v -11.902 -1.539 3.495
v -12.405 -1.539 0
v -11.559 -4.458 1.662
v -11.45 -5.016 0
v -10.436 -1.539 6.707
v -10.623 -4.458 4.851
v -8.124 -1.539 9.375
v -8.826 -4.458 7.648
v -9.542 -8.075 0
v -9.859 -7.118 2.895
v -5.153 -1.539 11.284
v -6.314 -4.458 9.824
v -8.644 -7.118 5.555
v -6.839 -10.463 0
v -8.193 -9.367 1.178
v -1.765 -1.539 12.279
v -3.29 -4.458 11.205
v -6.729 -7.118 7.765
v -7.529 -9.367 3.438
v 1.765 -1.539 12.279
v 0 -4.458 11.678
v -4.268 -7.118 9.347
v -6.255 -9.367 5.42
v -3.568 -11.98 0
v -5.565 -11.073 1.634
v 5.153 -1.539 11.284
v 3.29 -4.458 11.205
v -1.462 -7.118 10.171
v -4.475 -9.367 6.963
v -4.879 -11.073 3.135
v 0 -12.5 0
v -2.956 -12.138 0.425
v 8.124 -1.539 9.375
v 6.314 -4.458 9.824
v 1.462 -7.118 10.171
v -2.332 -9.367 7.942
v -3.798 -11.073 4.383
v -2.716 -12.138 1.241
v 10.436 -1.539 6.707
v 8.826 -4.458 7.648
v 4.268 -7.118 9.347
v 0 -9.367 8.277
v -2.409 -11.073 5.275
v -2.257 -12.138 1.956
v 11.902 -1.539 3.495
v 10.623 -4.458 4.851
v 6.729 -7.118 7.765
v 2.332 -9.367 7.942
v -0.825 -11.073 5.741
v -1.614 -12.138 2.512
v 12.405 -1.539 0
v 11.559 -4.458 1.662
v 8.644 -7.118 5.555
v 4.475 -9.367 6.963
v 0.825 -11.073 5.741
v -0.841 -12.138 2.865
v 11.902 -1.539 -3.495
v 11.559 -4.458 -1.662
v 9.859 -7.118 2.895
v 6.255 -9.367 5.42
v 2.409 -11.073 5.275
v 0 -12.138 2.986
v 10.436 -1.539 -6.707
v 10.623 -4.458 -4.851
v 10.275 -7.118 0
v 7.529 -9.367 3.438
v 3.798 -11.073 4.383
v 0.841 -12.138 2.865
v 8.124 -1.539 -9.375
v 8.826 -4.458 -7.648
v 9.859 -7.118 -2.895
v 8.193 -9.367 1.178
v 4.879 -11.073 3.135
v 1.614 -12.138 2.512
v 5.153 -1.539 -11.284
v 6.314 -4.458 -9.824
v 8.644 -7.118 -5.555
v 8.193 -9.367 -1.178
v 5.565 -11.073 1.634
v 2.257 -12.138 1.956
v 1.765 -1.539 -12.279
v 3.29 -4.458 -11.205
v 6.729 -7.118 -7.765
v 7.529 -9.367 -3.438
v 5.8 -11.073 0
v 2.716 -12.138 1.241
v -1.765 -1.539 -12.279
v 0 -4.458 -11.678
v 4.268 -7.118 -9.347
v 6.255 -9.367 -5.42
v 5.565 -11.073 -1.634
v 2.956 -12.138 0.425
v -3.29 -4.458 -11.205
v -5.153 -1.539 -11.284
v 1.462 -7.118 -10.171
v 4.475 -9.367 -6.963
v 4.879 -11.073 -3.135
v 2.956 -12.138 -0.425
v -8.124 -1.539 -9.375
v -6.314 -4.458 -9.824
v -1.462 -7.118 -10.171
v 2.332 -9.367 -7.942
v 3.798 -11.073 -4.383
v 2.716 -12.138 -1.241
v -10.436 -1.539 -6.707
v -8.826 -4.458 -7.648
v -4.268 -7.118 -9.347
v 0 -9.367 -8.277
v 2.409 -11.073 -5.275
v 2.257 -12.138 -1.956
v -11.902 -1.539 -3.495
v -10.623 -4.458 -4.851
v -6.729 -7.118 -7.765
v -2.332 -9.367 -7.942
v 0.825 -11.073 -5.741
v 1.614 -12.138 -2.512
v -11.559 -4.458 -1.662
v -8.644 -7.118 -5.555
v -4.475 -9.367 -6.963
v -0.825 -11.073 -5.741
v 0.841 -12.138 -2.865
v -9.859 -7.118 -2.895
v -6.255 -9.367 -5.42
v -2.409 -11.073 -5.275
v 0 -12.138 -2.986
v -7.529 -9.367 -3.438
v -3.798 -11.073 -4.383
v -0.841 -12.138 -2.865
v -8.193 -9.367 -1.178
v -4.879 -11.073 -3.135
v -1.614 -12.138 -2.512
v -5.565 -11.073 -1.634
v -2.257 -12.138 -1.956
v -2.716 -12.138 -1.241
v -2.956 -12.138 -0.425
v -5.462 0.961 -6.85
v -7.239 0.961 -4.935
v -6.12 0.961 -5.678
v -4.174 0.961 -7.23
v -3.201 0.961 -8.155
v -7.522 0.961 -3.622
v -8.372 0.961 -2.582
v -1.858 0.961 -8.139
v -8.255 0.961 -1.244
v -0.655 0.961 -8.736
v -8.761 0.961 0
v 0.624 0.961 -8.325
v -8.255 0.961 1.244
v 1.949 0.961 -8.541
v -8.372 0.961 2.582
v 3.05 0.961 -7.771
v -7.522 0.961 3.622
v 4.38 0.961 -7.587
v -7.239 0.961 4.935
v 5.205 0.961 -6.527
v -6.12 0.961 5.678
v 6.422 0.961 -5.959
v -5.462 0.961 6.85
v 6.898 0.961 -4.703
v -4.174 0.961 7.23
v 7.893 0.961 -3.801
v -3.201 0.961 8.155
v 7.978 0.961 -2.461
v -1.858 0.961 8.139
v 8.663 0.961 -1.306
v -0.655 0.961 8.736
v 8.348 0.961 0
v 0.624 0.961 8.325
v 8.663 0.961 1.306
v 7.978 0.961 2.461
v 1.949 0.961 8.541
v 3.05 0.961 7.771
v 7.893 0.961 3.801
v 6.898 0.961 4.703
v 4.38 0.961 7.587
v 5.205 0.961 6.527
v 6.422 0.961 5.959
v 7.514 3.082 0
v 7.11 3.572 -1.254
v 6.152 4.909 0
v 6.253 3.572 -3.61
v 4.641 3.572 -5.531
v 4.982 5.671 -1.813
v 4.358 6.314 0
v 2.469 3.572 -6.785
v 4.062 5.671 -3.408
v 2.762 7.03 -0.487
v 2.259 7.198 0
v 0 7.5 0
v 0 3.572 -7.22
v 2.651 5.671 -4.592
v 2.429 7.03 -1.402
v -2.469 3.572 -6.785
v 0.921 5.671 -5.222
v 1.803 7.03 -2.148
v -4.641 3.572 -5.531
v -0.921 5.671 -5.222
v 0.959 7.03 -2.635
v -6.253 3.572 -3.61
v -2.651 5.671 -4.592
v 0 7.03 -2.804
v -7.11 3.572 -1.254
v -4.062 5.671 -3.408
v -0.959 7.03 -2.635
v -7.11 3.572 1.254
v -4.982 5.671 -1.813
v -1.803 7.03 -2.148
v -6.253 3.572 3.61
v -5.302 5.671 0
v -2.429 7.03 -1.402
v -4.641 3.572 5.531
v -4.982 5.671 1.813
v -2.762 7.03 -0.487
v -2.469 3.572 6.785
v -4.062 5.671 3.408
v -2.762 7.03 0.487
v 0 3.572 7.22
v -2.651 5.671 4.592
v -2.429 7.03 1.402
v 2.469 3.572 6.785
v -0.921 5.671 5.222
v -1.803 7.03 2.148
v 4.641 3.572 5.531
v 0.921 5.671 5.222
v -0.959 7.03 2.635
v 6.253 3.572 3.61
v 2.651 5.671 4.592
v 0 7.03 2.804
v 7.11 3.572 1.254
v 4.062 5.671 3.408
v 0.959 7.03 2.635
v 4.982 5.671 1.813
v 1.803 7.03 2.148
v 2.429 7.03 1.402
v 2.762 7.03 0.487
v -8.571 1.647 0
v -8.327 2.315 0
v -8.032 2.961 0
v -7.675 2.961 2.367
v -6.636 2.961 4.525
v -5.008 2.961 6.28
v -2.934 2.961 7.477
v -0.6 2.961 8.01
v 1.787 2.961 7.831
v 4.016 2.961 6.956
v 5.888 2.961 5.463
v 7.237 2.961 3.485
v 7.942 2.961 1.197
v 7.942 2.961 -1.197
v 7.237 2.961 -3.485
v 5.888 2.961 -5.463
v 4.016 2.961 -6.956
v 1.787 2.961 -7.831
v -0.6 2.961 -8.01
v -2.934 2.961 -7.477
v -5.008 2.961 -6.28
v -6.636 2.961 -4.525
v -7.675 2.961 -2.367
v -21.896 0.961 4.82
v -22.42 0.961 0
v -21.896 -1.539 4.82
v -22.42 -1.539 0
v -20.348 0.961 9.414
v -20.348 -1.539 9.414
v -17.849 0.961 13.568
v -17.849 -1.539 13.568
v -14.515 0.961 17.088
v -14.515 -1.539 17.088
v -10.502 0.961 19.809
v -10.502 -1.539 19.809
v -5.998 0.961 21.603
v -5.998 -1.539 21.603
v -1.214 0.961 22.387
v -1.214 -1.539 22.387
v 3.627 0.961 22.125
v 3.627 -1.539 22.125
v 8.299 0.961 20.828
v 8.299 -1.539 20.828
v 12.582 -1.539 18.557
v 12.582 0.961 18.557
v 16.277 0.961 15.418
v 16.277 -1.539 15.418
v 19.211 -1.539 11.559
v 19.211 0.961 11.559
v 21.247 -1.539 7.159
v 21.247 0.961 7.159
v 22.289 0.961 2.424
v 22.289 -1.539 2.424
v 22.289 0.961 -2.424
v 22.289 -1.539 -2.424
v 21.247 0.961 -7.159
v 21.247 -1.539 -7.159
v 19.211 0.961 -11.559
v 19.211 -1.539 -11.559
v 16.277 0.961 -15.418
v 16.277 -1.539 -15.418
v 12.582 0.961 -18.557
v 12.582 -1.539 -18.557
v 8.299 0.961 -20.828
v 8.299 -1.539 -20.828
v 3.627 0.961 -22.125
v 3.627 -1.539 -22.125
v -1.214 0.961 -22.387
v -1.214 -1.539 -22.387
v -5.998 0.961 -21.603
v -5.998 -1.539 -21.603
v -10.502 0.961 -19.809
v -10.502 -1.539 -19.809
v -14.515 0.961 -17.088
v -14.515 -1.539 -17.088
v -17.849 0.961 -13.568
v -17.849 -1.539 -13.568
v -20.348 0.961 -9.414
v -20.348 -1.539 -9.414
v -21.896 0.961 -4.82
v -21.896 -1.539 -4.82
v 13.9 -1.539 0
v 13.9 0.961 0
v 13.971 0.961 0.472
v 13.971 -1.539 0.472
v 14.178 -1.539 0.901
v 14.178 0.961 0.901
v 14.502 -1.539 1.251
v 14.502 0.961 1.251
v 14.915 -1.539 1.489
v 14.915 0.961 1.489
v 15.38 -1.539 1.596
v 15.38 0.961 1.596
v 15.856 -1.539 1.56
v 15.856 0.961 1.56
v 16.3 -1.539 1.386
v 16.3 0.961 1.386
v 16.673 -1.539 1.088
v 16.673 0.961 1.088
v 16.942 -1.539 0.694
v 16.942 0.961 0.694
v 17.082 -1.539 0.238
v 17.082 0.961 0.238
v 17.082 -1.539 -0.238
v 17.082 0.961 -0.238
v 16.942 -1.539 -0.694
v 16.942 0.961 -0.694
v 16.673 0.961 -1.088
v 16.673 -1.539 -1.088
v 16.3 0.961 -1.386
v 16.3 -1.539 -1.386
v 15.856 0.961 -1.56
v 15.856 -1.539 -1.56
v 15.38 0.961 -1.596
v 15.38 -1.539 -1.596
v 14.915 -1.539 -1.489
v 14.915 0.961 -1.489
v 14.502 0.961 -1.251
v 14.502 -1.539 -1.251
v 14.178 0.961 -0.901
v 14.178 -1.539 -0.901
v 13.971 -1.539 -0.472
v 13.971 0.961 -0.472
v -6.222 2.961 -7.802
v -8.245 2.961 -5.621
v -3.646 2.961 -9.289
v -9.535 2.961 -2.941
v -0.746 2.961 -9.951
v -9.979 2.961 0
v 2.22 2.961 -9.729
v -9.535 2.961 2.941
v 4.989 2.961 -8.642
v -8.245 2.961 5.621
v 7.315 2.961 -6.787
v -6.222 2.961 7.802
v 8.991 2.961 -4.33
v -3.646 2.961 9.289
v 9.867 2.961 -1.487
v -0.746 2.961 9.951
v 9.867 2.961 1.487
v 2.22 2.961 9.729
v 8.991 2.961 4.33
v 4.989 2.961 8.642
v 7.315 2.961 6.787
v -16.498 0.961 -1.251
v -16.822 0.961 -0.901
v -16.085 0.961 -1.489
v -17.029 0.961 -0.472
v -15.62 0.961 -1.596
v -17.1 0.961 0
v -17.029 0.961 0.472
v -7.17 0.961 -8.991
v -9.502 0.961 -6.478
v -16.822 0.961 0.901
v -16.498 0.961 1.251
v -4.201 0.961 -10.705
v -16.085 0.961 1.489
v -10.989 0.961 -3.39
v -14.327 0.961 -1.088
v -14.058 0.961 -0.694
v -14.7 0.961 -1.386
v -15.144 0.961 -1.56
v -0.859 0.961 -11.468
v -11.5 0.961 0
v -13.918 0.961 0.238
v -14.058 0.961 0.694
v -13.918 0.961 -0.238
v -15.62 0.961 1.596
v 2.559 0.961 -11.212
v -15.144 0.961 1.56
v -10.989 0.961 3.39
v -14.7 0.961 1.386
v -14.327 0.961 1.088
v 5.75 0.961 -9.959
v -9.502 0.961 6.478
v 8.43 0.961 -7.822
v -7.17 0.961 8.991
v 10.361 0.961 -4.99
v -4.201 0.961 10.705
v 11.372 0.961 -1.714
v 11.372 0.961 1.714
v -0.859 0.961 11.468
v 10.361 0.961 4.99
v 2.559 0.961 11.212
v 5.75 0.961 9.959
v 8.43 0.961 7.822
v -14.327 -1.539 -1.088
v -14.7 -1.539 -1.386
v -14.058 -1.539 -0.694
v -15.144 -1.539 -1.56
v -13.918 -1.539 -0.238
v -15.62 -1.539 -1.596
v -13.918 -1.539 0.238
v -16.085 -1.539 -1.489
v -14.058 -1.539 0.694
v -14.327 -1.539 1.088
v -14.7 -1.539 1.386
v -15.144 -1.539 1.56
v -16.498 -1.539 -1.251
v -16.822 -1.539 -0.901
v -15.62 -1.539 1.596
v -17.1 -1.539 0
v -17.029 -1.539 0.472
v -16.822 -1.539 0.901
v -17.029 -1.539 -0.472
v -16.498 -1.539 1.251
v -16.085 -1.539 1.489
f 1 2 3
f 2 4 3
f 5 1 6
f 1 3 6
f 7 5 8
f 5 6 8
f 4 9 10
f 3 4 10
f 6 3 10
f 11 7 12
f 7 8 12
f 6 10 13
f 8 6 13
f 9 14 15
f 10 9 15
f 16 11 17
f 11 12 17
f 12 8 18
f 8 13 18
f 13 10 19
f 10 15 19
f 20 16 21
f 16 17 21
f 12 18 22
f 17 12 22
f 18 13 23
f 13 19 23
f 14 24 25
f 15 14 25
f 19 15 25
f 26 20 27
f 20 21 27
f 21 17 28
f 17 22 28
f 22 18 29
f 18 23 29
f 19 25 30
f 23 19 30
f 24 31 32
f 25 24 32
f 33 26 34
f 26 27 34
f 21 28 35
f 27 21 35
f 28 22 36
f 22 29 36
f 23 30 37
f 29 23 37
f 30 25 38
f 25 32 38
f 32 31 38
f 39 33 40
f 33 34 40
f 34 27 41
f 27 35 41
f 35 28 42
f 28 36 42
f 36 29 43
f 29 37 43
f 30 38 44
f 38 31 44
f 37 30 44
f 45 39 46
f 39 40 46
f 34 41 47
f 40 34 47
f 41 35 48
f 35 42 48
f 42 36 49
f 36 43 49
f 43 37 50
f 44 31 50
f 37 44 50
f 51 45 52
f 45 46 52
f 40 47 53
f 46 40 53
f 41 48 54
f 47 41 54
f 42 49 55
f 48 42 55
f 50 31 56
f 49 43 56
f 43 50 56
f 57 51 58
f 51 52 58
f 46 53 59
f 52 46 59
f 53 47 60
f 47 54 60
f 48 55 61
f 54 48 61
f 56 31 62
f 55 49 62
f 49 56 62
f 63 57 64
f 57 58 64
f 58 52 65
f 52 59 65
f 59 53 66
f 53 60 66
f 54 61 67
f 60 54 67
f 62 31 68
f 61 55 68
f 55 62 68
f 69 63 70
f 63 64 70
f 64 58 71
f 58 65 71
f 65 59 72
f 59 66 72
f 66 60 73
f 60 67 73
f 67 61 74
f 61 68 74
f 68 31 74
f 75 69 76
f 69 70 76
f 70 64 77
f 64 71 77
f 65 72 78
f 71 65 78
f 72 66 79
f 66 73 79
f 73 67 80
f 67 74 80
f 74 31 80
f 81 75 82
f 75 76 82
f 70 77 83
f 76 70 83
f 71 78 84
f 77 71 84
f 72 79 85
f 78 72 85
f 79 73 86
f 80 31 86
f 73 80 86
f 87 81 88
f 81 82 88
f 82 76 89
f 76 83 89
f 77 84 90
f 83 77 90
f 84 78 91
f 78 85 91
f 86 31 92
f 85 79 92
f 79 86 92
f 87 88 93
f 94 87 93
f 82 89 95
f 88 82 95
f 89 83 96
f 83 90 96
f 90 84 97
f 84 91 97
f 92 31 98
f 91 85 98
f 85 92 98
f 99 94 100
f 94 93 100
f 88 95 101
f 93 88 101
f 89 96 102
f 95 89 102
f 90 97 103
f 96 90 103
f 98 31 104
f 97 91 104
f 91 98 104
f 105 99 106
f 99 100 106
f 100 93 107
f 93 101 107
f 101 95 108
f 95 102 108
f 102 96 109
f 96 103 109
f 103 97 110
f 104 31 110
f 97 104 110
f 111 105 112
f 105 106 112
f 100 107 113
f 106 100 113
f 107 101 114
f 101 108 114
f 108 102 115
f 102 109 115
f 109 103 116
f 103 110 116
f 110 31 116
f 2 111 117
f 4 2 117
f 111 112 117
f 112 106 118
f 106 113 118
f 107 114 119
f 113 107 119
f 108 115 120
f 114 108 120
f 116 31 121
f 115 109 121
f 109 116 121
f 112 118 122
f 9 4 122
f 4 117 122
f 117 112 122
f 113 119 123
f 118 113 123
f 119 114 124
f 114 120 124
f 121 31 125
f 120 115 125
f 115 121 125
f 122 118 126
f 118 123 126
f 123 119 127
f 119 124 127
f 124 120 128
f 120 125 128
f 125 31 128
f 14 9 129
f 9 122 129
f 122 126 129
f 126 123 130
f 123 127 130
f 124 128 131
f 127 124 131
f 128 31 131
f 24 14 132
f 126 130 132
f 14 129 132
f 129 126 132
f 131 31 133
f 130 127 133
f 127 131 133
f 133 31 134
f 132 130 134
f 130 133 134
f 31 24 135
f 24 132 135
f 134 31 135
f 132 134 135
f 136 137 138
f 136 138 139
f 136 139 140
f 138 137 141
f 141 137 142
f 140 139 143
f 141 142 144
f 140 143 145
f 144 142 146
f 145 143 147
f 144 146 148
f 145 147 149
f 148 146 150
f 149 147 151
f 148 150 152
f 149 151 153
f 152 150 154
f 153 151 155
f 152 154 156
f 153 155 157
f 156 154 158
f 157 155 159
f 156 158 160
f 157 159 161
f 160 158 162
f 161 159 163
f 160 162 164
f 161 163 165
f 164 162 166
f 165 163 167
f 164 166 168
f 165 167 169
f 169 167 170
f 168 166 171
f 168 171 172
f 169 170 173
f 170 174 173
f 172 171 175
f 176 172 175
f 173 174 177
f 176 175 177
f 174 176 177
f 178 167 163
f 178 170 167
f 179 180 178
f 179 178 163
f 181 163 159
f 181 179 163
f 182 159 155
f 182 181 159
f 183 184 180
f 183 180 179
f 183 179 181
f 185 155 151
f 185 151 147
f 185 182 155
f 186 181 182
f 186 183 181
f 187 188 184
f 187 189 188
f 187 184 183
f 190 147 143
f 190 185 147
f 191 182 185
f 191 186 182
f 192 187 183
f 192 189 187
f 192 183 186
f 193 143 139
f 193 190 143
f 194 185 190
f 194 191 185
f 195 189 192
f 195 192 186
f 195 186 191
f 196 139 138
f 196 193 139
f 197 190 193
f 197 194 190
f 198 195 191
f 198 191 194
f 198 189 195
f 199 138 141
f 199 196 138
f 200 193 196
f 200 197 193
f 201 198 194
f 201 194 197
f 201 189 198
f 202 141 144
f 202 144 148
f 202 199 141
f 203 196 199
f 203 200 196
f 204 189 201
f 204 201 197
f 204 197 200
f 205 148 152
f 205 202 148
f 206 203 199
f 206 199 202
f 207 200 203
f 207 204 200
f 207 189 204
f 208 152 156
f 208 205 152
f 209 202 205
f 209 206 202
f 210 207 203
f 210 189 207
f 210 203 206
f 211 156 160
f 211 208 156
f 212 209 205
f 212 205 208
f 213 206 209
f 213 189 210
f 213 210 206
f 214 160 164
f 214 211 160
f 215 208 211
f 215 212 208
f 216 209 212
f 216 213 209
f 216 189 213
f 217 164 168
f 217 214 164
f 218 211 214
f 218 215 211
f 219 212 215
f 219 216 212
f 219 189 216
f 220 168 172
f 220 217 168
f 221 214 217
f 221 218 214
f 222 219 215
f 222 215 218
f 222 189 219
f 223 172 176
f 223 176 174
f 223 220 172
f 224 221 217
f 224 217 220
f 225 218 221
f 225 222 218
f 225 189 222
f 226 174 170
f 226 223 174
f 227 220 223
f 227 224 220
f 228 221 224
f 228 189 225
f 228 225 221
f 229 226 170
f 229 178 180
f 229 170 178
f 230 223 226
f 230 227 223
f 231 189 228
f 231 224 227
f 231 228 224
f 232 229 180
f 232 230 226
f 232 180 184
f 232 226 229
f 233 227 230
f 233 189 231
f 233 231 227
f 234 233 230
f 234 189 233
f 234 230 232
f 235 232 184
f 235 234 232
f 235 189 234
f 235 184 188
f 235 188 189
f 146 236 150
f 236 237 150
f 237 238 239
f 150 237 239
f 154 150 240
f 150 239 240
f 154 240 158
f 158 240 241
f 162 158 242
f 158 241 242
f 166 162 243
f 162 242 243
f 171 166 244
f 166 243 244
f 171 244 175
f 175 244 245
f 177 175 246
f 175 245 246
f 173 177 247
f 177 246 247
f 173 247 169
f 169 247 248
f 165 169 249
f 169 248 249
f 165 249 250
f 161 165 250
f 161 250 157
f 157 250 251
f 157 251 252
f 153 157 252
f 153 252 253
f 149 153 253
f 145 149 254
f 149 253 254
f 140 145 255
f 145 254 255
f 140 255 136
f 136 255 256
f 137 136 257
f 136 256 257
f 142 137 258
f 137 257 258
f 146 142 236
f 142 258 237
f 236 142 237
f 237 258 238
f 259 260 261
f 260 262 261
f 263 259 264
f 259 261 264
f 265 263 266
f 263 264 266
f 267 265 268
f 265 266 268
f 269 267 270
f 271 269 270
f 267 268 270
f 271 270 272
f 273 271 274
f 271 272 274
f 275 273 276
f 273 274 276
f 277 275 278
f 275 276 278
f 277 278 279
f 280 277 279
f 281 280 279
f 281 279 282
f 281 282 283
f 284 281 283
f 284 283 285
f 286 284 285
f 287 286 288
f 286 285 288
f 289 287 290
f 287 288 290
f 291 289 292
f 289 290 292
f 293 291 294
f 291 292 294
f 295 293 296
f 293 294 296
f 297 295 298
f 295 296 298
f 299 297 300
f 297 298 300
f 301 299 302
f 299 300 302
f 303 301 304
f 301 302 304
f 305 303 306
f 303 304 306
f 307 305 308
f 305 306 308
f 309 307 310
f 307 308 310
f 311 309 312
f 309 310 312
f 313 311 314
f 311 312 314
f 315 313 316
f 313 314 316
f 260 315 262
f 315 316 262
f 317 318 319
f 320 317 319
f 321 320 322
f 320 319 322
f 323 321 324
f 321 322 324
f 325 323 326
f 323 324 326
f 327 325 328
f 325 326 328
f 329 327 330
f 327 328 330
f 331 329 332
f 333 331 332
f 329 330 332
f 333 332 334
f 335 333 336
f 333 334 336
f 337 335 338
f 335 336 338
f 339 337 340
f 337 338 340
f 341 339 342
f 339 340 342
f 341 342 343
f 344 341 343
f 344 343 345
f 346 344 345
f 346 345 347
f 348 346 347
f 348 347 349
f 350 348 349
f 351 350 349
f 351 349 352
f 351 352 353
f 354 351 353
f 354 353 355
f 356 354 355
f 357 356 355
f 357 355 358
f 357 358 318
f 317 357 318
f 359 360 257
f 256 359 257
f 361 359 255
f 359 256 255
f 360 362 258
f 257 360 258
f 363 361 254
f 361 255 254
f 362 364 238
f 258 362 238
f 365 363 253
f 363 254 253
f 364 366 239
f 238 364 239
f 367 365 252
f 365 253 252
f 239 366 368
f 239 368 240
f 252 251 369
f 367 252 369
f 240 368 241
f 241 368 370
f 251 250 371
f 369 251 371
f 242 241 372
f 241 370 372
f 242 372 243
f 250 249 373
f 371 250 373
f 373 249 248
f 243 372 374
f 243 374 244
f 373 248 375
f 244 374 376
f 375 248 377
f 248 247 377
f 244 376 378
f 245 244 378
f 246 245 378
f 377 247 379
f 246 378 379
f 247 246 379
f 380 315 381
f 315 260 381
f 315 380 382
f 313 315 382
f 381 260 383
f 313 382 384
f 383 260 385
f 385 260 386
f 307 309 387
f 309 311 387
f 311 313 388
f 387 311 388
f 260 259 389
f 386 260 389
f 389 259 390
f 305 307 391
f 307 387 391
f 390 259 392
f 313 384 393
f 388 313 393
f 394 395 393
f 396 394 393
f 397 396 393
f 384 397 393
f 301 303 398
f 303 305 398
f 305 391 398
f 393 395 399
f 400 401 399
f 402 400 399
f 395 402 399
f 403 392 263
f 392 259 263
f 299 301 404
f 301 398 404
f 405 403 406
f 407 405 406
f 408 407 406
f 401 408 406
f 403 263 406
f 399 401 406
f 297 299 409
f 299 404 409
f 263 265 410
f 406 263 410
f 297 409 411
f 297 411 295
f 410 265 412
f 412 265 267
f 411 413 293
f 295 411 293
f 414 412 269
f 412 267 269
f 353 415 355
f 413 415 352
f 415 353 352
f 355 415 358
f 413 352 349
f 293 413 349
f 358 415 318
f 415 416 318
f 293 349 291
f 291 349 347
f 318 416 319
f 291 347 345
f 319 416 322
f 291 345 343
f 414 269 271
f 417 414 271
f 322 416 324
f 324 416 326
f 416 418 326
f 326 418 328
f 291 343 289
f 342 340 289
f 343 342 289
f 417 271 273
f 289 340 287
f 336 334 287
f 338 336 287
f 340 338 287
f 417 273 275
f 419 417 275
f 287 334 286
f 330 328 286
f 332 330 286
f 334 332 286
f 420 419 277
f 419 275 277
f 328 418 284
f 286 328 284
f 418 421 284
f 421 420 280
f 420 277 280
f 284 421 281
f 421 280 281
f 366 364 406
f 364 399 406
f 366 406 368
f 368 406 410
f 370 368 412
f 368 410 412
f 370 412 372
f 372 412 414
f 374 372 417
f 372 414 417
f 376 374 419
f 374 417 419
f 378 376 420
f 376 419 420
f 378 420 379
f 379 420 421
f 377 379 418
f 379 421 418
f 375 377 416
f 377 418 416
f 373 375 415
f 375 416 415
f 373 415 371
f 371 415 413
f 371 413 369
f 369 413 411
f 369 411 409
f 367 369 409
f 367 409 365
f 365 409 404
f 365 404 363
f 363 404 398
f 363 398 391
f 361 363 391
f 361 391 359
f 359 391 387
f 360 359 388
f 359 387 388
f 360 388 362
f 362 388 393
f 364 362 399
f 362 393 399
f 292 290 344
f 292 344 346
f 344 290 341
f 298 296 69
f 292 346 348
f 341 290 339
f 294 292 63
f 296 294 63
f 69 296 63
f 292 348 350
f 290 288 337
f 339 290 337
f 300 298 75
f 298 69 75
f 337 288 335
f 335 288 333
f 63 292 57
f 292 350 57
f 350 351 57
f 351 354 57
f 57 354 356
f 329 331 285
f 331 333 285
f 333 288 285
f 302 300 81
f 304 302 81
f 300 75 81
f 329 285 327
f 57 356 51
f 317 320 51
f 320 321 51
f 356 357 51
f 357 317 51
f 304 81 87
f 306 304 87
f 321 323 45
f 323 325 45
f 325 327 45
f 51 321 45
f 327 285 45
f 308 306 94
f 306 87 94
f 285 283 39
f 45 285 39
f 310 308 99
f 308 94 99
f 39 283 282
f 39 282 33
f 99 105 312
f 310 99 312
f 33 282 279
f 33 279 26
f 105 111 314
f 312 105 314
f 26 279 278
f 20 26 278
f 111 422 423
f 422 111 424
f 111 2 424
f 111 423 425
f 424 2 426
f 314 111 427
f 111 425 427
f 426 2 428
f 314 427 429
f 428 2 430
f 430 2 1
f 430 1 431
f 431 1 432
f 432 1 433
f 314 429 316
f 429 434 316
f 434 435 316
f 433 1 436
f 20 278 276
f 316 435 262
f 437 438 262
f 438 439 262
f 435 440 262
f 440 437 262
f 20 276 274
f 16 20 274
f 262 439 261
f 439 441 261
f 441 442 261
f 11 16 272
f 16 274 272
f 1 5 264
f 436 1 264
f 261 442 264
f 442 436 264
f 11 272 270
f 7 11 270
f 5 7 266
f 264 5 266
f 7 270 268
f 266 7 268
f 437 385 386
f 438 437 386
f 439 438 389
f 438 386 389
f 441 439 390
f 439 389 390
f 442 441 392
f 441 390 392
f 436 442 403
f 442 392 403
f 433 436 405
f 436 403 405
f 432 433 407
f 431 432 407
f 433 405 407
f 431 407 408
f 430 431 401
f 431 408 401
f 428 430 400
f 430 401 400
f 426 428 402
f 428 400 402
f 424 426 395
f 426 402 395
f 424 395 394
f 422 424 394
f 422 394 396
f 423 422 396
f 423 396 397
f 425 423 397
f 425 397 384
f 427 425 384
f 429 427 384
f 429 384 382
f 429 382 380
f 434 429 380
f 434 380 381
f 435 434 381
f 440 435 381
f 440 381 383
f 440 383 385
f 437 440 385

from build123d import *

# Parameters (mm, degrees)
SKETCH_2_R          = 1.6
CUT_EXTRUDE_1_DEPTH = 10


with BuildPart() as part:
    # 草图1 → 旋转5 (revolve)
    with BuildSketch(Plane.XY):
        with BuildLine():
            Line((-11.5, 0.961485209), (-22.420203846, 0.961485209))
            Line((-22.420203846, 0.961485209), (-22.420203846, -1.538514791))
            Line((-22.420203846, -1.538514791), (-12.404957567, -1.538514791))
            ThreePointArc((-12.404957567, -1.538514791), (-8.277033439, -9.367001518), (0, -12.5))
            Line((0, -12.5), (0, 0.961485209))
            Line((0, 0.961485209), (-8.348478365, 0.961485209))
            Line((-8.348478365, 0.961485209), (-8.760960883, 0.961485209))
            ThreePointArc((-8.760960883, 0.961485209), (-8.455804212, 1.983114098), (-8.031969161, 2.961485209))
            Line((-8.031969161, 2.961485209), (-9.978754751, 2.961485209))
            Line((-9.978754751, 2.961485209), (-11.5, 0.961485209))
        make_face()
    revolve(axis=Axis((0, 0, 0), (0, 1, 0)))

    # 草图1<6> → 旋转8 (revolve)
    with BuildSketch(Plane.XY):
        with BuildLine():
            Line((0, 7.5), (0, 0.961485209))
            Line((0, 0.961485209), (8.348478365, 0.961485209))
            ThreePointArc((8.348478365, 0.961485209), (5.302104928, 5.670819301), (0, 7.5))
        make_face()
    revolve(axis=Axis((0, 0, 0), (0, 1, 0)))

    # 草图2 → 切除-拉伸1 (cut)
    with BuildSketch(Plane(origin=(0, 0.961485209, 0), x_dir=(1, 0, 0), z_dir=(0, 1, 0))):
        with Locations((-15.5, 0)):
            Circle(SKETCH_2_R)
        with Locations((15.5, 0)):
            Circle(SKETCH_2_R)
    extrude(amount=-CUT_EXTRUDE_1_DEPTH, mode=Mode.SUBTRACT)


solid = part.part
